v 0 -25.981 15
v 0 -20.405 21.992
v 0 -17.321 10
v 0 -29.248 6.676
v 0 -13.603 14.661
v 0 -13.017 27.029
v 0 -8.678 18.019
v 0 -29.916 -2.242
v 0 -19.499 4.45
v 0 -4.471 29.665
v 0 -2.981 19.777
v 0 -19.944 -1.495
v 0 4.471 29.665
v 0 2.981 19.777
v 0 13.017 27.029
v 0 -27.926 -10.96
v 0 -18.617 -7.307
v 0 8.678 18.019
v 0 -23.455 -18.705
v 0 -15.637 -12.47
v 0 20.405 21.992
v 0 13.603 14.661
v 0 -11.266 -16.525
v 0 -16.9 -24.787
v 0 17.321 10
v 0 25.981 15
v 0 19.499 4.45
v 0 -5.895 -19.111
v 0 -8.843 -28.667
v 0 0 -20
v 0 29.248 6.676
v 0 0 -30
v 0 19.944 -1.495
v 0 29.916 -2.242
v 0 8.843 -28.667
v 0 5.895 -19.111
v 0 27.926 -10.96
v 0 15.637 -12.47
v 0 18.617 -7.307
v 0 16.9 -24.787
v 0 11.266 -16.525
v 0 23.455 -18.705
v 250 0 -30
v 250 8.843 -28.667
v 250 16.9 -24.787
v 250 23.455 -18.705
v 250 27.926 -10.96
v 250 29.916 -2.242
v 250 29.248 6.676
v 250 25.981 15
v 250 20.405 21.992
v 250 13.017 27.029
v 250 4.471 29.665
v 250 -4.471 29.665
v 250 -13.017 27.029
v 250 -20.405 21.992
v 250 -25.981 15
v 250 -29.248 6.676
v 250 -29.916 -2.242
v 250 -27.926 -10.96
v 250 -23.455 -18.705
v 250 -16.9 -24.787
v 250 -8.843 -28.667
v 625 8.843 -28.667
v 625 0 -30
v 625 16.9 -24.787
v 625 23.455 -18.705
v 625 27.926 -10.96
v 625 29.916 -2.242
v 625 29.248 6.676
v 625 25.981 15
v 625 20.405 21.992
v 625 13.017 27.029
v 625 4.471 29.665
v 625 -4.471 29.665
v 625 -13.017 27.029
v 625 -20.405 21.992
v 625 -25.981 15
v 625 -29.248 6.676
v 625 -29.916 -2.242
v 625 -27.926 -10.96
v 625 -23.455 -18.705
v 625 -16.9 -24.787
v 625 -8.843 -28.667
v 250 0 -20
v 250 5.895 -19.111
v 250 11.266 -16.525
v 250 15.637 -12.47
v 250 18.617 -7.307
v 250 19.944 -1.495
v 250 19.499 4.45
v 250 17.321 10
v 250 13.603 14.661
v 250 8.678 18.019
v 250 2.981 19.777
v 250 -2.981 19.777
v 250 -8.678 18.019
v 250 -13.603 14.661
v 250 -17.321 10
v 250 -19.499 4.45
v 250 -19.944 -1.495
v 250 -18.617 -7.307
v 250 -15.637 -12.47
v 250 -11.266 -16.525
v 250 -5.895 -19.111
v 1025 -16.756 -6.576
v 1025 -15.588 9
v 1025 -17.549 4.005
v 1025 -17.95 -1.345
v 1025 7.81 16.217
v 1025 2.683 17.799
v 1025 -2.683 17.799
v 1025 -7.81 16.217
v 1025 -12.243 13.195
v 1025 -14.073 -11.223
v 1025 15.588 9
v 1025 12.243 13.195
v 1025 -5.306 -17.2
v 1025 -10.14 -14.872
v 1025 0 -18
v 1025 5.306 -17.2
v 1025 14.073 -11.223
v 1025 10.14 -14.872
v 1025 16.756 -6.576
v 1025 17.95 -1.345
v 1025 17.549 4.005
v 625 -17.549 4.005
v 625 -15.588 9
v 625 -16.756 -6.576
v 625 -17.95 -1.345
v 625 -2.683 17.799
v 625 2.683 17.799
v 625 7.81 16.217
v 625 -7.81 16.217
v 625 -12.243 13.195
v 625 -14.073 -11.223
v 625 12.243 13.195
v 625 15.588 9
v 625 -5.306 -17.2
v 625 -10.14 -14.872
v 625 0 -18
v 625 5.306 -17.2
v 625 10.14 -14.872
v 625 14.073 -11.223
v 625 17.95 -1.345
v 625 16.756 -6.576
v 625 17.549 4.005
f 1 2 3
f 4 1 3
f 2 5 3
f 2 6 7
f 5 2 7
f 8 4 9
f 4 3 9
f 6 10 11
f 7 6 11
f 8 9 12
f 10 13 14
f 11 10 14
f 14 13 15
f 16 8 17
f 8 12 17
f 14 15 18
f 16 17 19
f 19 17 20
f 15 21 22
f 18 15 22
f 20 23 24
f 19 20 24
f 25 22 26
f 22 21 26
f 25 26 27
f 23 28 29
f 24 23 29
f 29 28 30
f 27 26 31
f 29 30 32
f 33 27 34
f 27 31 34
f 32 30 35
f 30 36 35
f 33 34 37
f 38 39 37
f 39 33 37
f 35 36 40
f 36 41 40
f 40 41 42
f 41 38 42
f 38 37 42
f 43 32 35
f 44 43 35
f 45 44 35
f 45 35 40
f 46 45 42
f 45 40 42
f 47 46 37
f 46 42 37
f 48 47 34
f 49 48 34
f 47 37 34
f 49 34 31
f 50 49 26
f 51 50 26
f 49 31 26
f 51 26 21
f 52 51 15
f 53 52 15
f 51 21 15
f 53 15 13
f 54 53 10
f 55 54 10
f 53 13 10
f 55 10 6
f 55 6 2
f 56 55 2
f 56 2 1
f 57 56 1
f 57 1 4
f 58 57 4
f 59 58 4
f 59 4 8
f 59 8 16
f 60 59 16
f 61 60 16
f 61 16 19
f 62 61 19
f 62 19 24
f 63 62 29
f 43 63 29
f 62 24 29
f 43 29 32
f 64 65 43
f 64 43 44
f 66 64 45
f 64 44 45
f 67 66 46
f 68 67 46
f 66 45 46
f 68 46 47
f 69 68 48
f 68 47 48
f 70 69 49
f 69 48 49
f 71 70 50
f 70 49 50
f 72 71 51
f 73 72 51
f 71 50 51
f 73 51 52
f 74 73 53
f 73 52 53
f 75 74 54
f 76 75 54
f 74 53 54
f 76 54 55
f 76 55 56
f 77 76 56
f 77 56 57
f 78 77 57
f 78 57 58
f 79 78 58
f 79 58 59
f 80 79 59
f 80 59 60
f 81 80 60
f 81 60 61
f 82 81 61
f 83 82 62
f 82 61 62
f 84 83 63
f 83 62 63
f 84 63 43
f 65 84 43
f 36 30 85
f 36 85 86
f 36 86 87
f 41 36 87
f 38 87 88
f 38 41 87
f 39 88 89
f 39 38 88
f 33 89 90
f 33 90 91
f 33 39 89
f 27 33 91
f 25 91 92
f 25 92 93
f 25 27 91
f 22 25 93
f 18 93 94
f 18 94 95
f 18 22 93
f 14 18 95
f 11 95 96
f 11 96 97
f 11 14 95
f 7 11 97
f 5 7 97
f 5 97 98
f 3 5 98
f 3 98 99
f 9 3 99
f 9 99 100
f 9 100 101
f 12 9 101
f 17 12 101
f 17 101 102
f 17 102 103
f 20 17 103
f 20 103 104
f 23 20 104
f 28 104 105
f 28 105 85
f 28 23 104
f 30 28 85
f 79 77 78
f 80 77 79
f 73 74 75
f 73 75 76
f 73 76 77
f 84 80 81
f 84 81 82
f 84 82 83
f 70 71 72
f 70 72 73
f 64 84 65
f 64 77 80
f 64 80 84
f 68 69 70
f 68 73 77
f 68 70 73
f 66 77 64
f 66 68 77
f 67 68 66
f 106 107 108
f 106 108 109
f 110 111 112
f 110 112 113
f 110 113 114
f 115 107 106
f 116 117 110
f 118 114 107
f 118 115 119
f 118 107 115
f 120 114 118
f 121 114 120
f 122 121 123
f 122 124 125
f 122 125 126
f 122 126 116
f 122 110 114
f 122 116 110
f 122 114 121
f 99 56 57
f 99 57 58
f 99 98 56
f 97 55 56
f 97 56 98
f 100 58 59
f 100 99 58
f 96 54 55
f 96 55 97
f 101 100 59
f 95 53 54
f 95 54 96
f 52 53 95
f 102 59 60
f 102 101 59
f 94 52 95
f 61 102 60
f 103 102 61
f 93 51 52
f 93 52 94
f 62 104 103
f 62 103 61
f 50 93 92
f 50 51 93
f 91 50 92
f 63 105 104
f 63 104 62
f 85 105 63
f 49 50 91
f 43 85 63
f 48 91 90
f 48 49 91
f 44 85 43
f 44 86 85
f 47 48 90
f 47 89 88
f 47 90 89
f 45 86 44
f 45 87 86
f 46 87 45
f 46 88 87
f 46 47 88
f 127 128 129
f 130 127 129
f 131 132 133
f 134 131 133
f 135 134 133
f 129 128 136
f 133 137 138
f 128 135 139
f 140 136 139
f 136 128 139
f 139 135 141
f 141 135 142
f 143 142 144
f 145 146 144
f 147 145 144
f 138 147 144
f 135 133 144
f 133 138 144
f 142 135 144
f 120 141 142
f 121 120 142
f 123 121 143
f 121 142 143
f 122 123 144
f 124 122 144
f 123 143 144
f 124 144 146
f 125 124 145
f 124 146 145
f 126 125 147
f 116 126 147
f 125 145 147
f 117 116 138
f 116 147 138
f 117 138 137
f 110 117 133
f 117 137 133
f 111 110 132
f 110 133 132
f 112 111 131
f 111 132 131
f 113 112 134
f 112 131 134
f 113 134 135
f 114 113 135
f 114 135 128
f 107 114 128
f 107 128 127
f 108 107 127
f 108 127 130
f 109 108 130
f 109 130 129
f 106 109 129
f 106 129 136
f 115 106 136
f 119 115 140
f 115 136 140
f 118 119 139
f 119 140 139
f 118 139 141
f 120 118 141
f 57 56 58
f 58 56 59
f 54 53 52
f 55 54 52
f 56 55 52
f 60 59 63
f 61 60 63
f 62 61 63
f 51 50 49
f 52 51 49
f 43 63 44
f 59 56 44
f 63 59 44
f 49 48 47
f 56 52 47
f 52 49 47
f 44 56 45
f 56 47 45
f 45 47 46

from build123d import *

# Parameters (mm, degrees)
SKETCH1_R           = 30
SKETCH1_R_2         = 20
BOSS_EXTRUDE1_DEPTH = 250
SKETCH2_R           = 30
BOSS_EXTRUDE2_DEPTH = 375
SKETCH3_R           = 18
BOSS_EXTRUDE3_DEPTH = 400


with BuildPart() as part:
    # Sketch1 → Boss-Extrude1 (new body)
    with BuildSketch(Plane(origin=(0, 0, 0), x_dir=(0, 0, -1), z_dir=(1, 0, 0))):
        Circle(SKETCH1_R)
        Circle(SKETCH1_R_2, mode=Mode.SUBTRACT)
    extrude(amount=BOSS_EXTRUDE1_DEPTH)


with BuildPart() as body_2:
    # Sketch2 → Boss-Extrude2 (new body)
    with BuildSketch(Plane(origin=(250, 0, 0), x_dir=(0, 0, -1), z_dir=(1, 0, 0))):
        Circle(SKETCH2_R)
    extrude(amount=BOSS_EXTRUDE2_DEPTH)


with BuildPart() as body_3:
    # Sketch3 → Boss-Extrude3 (new body)
    with BuildSketch(Plane(origin=(625, 0, 0), x_dir=(0, 0, -1), z_dir=(1, 0, 0))):
        Circle(SKETCH3_R)
    extrude(amount=BOSS_EXTRUDE3_DEPTH)


solid = Compound([part.part, body_2.part, body_3.part])
